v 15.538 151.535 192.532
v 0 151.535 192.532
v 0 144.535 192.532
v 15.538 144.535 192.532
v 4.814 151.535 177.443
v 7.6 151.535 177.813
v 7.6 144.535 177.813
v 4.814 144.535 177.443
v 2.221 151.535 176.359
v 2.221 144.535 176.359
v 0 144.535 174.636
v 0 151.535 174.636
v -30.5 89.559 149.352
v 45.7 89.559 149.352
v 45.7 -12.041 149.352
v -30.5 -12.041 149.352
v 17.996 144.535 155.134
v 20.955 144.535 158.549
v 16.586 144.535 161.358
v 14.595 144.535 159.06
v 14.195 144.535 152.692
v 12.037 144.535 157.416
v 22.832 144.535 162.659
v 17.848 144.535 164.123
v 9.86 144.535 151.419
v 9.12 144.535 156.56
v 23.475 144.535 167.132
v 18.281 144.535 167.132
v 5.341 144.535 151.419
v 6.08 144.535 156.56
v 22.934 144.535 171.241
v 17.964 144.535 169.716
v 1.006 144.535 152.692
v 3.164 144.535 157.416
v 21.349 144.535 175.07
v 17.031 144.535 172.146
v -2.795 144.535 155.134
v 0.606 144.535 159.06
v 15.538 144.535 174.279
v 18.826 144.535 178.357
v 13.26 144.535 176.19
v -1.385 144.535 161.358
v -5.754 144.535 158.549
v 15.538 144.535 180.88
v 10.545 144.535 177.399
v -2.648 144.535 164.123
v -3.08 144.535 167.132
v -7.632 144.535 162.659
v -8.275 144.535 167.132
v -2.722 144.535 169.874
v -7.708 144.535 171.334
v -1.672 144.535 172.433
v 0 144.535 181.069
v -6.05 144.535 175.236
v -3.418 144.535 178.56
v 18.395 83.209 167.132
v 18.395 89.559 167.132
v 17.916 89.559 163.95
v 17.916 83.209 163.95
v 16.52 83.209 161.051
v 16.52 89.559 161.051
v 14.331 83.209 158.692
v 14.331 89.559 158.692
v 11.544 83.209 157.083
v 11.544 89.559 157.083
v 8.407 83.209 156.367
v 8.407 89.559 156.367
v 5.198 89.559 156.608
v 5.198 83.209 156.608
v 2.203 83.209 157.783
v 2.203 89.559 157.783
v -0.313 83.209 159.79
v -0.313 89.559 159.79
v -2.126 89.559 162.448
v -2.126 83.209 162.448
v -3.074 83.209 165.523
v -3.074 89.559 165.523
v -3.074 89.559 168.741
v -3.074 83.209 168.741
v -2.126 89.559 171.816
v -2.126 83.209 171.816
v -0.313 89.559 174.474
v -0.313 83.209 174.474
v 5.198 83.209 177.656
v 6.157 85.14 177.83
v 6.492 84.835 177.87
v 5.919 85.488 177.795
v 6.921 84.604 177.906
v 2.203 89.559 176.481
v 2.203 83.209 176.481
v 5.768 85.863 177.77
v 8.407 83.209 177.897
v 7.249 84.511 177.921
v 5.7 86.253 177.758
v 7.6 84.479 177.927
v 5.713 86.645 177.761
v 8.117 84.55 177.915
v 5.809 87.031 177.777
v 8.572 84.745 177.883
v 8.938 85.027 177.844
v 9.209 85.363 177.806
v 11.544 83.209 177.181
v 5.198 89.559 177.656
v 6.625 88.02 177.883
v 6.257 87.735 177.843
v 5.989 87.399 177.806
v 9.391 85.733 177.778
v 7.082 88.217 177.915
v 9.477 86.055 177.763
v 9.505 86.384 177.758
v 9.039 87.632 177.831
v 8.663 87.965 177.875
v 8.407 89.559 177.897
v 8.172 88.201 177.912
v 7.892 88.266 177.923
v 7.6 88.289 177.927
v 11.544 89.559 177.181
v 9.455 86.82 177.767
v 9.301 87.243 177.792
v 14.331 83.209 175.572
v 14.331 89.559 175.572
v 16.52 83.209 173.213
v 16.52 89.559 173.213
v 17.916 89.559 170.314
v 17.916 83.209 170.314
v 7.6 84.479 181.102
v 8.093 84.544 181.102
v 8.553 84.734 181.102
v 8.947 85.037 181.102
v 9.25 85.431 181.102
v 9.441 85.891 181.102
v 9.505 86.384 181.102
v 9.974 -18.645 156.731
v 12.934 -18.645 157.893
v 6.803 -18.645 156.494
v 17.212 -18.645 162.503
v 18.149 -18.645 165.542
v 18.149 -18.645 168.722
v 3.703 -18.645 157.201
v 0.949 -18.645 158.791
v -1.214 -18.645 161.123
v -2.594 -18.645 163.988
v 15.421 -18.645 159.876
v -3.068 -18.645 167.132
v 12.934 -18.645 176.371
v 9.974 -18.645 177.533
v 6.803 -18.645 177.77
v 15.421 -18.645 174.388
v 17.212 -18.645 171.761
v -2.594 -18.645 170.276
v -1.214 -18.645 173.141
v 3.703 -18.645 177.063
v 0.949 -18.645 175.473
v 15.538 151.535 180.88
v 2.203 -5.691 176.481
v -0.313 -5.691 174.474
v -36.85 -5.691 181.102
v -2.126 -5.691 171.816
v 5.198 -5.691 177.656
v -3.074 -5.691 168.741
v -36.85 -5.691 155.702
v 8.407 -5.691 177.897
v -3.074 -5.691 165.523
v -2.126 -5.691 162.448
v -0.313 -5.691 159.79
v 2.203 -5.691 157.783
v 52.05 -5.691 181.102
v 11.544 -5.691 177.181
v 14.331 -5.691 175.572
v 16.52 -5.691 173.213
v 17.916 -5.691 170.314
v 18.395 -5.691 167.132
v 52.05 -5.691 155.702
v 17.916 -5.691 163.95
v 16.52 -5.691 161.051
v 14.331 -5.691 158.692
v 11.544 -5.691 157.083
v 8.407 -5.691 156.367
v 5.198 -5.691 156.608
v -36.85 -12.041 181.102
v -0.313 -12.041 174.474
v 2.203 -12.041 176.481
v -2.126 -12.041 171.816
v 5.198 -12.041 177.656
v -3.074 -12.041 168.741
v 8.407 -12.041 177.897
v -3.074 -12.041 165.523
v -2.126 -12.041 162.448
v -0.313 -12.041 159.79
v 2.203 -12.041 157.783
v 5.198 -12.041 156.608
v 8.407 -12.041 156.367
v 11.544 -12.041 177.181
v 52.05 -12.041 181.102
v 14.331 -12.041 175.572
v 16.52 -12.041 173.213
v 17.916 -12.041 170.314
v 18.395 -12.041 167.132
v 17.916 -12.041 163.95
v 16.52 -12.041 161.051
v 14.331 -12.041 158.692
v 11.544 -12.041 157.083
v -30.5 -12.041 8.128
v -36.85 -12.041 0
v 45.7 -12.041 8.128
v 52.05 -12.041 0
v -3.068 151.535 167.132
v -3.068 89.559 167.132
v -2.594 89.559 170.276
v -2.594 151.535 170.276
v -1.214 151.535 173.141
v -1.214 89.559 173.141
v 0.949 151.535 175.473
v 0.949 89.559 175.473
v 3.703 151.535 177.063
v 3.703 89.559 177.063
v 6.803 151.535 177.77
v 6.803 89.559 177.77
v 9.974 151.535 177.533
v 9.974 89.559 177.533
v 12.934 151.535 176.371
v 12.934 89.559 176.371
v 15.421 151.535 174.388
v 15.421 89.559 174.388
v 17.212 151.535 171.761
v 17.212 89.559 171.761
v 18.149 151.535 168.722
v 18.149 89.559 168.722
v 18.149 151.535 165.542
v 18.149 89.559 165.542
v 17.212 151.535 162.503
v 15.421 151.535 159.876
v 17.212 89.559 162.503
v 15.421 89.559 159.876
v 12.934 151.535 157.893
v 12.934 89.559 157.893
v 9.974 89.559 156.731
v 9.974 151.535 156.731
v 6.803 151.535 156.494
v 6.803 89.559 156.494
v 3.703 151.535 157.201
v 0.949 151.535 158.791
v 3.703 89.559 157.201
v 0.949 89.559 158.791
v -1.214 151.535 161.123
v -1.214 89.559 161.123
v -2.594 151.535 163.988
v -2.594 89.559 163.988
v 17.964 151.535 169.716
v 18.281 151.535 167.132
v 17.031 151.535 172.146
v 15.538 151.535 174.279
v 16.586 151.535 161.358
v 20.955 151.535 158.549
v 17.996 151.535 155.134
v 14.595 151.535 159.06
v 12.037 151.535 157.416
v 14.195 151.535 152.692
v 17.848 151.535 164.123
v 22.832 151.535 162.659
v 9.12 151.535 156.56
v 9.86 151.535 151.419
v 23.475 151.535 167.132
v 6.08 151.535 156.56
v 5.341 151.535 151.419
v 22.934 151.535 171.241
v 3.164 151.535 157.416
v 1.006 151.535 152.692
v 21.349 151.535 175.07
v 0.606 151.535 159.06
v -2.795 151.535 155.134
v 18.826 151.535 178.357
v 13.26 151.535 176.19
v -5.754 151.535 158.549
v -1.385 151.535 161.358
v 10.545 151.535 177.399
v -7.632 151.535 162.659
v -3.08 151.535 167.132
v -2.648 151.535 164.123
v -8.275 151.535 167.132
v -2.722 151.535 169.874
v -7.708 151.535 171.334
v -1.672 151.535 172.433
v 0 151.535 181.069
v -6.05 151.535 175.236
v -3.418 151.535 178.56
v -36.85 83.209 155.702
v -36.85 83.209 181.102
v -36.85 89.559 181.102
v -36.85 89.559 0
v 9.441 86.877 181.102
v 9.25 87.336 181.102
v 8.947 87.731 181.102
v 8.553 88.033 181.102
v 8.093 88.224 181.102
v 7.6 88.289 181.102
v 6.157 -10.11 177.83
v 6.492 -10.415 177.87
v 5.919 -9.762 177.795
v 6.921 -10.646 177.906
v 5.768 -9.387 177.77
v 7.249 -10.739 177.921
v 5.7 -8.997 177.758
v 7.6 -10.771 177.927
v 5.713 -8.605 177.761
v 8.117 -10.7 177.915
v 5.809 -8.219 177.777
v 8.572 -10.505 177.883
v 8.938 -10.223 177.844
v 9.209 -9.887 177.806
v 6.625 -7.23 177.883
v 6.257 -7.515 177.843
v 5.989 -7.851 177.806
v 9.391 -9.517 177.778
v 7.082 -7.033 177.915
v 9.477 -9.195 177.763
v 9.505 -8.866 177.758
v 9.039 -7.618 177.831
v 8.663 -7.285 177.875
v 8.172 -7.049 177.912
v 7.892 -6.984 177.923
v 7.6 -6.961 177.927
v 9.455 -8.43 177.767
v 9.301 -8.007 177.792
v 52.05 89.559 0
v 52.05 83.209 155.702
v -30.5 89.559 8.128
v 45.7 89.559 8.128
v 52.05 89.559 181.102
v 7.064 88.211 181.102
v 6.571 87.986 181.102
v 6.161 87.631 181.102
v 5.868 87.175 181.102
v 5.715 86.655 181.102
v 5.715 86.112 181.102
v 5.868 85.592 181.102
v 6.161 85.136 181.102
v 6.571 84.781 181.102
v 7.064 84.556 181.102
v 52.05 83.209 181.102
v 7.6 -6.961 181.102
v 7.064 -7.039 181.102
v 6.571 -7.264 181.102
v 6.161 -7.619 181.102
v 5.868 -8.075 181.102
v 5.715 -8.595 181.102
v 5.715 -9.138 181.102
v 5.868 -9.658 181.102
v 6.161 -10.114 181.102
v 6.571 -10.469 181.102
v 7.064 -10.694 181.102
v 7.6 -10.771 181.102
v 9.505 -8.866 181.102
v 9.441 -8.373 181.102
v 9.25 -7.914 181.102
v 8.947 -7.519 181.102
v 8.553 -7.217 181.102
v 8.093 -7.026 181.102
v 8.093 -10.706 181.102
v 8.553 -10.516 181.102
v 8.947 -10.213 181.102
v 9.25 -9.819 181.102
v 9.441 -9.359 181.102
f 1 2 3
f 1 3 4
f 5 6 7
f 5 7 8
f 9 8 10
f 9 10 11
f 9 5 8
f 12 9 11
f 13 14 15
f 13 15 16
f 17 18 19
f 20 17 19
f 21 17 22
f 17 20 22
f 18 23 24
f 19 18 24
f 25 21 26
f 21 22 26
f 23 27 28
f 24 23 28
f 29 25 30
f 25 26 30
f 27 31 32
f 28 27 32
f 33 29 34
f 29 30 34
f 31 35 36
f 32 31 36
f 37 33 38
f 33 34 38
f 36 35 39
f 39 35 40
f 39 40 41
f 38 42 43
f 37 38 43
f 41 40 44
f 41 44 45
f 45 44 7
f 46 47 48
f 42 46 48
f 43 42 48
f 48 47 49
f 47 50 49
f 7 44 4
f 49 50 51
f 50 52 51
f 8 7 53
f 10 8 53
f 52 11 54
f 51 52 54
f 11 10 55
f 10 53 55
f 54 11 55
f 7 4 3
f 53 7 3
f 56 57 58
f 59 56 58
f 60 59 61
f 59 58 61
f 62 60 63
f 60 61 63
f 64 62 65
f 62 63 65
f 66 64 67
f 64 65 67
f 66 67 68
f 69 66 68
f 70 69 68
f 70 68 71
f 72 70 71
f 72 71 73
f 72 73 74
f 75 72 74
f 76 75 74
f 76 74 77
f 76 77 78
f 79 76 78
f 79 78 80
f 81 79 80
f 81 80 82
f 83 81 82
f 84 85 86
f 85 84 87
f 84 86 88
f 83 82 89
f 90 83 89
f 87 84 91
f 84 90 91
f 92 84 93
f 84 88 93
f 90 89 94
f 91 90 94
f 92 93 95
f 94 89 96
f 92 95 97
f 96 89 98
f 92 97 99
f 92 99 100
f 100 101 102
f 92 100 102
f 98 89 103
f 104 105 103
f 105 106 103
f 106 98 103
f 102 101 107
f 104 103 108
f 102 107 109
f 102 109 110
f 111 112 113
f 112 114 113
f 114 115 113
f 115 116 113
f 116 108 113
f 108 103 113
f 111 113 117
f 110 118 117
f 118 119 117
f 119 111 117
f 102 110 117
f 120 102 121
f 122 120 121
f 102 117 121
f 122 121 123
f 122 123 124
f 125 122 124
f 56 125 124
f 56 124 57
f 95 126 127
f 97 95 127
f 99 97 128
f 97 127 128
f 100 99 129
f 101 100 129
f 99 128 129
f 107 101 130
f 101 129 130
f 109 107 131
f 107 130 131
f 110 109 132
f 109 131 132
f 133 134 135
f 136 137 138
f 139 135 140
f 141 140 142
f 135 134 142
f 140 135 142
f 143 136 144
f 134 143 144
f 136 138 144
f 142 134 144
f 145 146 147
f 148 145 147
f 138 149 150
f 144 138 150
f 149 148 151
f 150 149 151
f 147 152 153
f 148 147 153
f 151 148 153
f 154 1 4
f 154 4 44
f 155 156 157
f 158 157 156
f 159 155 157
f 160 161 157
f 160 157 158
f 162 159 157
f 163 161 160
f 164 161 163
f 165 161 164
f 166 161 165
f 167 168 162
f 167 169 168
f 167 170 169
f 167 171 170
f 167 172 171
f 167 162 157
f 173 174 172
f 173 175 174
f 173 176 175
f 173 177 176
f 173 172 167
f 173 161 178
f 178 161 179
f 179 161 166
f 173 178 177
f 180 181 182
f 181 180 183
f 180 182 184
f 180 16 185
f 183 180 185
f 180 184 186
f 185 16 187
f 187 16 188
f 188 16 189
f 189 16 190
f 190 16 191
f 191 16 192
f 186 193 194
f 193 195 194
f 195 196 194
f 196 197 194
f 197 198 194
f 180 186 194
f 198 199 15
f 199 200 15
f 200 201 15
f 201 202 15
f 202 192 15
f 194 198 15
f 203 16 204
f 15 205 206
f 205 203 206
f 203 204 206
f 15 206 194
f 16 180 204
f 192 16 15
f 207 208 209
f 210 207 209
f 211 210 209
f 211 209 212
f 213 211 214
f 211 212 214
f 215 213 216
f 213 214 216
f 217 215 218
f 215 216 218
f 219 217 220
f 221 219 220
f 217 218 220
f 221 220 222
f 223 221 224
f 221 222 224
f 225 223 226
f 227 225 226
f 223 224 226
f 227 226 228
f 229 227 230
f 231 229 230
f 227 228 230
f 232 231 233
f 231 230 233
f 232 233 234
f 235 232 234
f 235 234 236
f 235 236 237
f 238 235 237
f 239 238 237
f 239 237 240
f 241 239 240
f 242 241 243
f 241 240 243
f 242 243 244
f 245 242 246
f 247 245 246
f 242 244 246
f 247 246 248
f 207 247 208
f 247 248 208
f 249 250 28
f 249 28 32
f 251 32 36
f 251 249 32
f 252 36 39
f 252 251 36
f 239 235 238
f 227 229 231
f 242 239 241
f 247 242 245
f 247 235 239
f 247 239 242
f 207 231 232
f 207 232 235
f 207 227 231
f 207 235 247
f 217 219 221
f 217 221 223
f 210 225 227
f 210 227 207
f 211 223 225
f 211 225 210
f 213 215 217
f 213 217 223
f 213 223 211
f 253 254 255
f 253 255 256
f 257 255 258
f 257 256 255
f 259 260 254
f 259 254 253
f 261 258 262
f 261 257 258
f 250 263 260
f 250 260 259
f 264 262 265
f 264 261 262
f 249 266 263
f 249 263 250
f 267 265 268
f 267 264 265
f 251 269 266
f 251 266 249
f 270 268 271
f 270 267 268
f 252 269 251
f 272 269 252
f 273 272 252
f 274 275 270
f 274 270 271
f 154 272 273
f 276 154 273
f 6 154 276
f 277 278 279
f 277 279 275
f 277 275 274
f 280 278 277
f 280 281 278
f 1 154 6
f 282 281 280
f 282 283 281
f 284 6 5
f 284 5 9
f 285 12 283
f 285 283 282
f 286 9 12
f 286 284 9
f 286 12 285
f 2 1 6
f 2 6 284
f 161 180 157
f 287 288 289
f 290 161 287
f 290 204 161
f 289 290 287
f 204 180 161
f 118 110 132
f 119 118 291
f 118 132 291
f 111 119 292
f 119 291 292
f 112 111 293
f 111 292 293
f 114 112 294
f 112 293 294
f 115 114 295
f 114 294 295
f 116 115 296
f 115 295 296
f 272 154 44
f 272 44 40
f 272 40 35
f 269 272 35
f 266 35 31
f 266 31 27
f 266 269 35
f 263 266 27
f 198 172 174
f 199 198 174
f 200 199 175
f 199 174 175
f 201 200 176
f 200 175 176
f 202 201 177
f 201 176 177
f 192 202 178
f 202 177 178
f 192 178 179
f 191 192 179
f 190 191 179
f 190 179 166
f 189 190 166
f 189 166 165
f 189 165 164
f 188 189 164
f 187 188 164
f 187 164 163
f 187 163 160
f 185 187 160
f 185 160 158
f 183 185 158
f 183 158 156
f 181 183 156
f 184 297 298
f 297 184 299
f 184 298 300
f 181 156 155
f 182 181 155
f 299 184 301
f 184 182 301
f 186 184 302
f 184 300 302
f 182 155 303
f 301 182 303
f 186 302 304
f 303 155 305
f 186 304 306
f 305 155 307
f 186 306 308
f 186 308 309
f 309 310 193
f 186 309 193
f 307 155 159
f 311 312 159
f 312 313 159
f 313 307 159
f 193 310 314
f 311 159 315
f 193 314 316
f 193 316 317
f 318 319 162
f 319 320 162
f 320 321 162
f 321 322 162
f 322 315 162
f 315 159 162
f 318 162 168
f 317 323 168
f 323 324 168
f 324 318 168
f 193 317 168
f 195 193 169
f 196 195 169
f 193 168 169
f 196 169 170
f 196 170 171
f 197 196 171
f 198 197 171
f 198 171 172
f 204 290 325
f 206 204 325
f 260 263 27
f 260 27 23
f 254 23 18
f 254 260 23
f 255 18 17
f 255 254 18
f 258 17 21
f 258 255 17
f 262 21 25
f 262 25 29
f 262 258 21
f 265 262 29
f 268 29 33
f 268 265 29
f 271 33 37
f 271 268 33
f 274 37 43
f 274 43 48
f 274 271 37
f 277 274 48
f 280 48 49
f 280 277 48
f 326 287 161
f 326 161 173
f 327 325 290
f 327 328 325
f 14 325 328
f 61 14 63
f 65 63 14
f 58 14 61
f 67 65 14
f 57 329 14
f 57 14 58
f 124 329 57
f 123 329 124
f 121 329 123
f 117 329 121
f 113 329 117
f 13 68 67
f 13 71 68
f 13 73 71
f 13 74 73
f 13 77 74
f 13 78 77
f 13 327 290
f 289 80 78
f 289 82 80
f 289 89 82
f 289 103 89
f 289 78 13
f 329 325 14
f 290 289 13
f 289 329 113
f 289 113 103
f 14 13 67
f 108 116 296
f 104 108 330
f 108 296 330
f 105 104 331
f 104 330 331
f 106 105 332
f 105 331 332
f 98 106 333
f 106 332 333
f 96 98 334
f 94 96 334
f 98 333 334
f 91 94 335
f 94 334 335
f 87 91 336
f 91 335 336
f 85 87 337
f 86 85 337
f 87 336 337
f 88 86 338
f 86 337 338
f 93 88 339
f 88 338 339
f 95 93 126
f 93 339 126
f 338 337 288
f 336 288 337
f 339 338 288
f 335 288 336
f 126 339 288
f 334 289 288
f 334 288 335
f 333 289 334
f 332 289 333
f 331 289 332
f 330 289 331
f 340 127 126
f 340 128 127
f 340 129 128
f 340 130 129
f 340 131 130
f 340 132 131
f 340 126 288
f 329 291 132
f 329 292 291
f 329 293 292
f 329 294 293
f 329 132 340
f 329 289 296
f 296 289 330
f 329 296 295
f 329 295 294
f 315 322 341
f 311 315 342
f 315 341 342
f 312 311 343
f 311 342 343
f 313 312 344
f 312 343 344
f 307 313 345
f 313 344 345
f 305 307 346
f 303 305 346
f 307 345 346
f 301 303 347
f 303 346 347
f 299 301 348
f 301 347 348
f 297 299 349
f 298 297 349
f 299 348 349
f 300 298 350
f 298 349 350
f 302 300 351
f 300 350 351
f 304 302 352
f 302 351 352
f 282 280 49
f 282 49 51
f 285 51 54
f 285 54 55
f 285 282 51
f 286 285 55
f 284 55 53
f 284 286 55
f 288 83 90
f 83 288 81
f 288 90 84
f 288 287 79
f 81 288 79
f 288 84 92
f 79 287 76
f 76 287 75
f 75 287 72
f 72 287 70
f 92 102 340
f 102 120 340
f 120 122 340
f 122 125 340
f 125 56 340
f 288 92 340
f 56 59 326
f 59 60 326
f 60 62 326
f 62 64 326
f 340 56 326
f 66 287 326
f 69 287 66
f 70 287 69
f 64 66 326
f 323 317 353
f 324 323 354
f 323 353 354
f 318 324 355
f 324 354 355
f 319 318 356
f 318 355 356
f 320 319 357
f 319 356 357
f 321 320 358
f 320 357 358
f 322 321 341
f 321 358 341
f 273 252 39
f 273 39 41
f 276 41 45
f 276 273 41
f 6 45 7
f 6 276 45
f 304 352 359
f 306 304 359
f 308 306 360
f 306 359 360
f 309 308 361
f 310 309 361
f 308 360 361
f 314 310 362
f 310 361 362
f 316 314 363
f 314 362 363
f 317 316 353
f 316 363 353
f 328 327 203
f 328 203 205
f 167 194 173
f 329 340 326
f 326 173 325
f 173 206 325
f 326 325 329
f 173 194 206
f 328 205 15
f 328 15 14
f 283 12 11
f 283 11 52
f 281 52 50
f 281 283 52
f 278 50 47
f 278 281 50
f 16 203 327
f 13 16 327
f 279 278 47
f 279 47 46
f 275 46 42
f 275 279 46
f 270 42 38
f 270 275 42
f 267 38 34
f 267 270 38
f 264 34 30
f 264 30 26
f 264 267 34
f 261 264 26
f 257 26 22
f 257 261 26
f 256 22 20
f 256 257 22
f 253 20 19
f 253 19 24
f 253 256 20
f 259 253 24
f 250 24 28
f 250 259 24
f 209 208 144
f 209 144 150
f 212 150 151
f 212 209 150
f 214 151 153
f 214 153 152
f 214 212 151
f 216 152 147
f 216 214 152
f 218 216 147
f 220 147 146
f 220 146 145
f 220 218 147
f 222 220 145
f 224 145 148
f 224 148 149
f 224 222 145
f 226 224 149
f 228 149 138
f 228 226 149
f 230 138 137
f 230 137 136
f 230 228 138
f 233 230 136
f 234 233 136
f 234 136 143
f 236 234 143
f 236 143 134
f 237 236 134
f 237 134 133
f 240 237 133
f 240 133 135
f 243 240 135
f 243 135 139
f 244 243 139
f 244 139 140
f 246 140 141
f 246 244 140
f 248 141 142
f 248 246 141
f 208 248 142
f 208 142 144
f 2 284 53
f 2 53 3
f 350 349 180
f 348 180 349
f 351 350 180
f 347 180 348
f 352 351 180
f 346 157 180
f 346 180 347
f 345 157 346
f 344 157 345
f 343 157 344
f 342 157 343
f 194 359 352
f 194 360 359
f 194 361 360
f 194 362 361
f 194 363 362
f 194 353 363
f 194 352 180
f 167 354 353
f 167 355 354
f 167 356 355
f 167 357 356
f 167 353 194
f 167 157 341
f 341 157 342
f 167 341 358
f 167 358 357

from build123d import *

# Parameters (mm, degrees)
F0_W      = 88.9
F0_H      = 101.6
F1_DEPTH  = 8.128
F2_W      = 6.35
F2_H      = 101.6
F3_DEPTH  = 141.224
F5_DEPTH  = 101.6
F6_W      = 88.9
F6_H      = 6.35
F7_DEPTH  = 25.4
F9_DEPTH  = 153.162
F10_R     = 10.668
F11_DEPTH = 108.204
F12_DEPTH = 61.976
F14_DEPTH = 7
F16_DEPTH = 7.62
F18_DEPTH = 7.62


with BuildPart() as f1:
    # F0 (on Top) → F1 (new body)
    with BuildSketch(Plane.XY):
        with Locations((7.6004267454, 38.7586035386)):
            Rectangle(F0_W, F0_H)
    extrude(amount=F1_DEPTH)

    # F2 (on face) → F3 (join)
    with BuildSketch(Plane.XY.offset(8.128)):
        with Locations((48.8754267454, 38.7586035386)):
            Rectangle(F2_W, F2_H)
        with Locations((-33.6745732546, 38.7586035386)):
            Rectangle(F2_W, F2_H)
    extrude(amount=F3_DEPTH)

    # F4 (on face) → F5 (join)
    with BuildSketch(Plane(origin=(0, 89.5586035386, 0), x_dir=(-1, 0, 0), z_dir=(0, 1, 0))):
        Polygon((-52.0504267454, 155.702), (-52.0504267454, 149.352), (-45.7004267454, 149.352), (30.4995732546, 149.352), (36.8495732546, 149.352), (36.8495732546, 155.702), align=None)
    extrude(amount=-F5_DEPTH)

    # F6 (on face) → F7 (join)
    with BuildSketch(Plane.XY.offset(155.702)):
        with Locations((7.6004267454, -8.8663964614)):
            Rectangle(F6_W, F6_H)
        with Locations((7.6004267454, 86.3836035386)):
            Rectangle(F6_W, F6_H)
    extrude(amount=F7_DEPTH)

    # F8 (on face) → F9 (cut)
    with BuildSketch(Plane(origin=(0, 89.5586035386, 0), x_dir=(-1, 0, 0), z_dir=(0, 1, 0))):
        with BuildLine():
            Line((-7.6004267454, 167.132), (3.1945732546, 167.132))
            ThreePointArc((3.1945732546, 167.132), (-7.6004267454, 177.927), (-18.3954267454, 167.132))
            Line((-18.3954267454, 167.132), (-7.6004267454, 167.132))
        make_face()
        with BuildLine():
            ThreePointArc((-18.3954267454, 167.132), (-7.6004267454, 156.337), (3.1945732546, 167.132))
            Line((3.1945732546, 167.132), (-7.6004267454, 167.132))
            Line((-7.6004267454, 167.132), (-18.3954267454, 167.132))
        make_face()
    extrude(amount=-F9_DEPTH, mode=Mode.SUBTRACT)

    # F15 (on face) → F16 (cut)
    with BuildSketch(Plane.XY.offset(181.102)):
        with BuildLine():
            ThreePointArc((9.5054267454, -8.8663964614), (8.9474651636, -7.5193580433), (7.6004267454, -6.9613964614))
            Line((7.6004267454, -6.9613964614), (7.6004267454, -10.7713964614))
            ThreePointArc((7.6004267454, -10.7713964614), (8.9474651636, -10.2134348796), (9.5054267454, -8.8663964614))
        make_face()
        with BuildLine():
            Line((7.6004267454, -10.7713964614), (7.6004267454, -6.9613964614))
            ThreePointArc((7.6004267454, -6.9613964614), (5.6954267454, -8.8663964614), (7.6004267454, -10.7713964614))
        make_face()
    extrude(amount=-F16_DEPTH, mode=Mode.SUBTRACT)

    # F17 (on face) → F18 (cut)
    with BuildSketch(Plane.XY.offset(181.102)):
        with BuildLine():
            ThreePointArc((9.5054267454, 86.3836035386), (8.9474651636, 87.7306419567), (7.6004267454, 88.2886035386))
            Line((7.6004267454, 88.2886035386), (7.6004267454, 84.4786035386))
            ThreePointArc((7.6004267454, 84.4786035386), (8.9474651636, 85.0365651204), (9.5054267454, 86.3836035386))
        make_face()
        with BuildLine():
            Line((7.6004267454, 84.4786035386), (7.6004267454, 88.2886035386))
            ThreePointArc((7.6004267454, 88.2886035386), (5.6954267454, 86.3836035386), (7.6004267454, 84.4786035386))
        make_face()
    extrude(amount=-F18_DEPTH, mode=Mode.SUBTRACT)


with BuildPart() as f11:
    # F10 (on face) → F11 (new body)
    with BuildSketch(Plane(origin=(0, 89.5586035386, 0), x_dir=(-1, 0, 0), z_dir=(0, 1, 0))):
        with Locations((-7.6004267454, 167.132)):
            Circle(F10_R)
    extrude(amount=-F11_DEPTH)

    # F12 (add): a face of the model
    f12_faces = [f11.faces().sort_by_distance(p)[0] for p in [
        (7.6004267454, 89.5586035386, 167.132),
    ]]
    extrude(f12_faces, amount=F12_DEPTH)


with BuildPart() as f14:
    # F13 (on face) → F14 (new body)
    with BuildSketch(Plane(origin=(0, 151.5346035386, 0), x_dir=(-1, 0, 0), z_dir=(0, 1, 0))):
        with BuildLine():
            Line((-18.2811267454, 167.132), (-23.4754267454, 167.132))
            ThreePointArc((-23.4754267454, 167.132), (-7.6004267454, 151.257), (8.2745732546, 167.132))
            Line((8.2745732546, 167.132), (3.0802732546, 167.132))
            ThreePointArc((3.0802732546, 167.132), (-7.6004267454, 156.4513), (-18.2811267454, 167.132))
        make_face()
        with BuildLine():
            ThreePointArc((-15.5379267454, 180.8801532851), (-21.3485800305, 175.0695), (-23.4754267454, 167.132))
            Line((-23.4754267454, 167.132), (-18.2811267454, 167.132))
            ThreePointArc((-18.2811267454, 167.132), (-17.5717709061, 170.9594858746), (-15.5379267454, 174.2785688439))
            Line((-15.5379267454, 174.2785688439), (-15.5379267454, 180.8801532851))
        make_face()
        with BuildLine():
            Line((0, 174.6360566214), (0, 181.069328951))
            ThreePointArc((0, 181.069328951), (-3.6786587829, 182.514956837), (-7.6004267454, 183.007))
            Line((-7.6004267454, 183.007), (-7.6004267454, 177.8127))
            ThreePointArc((-7.6004267454, 177.8127), (-3.4816420379, 176.9865910632), (0, 174.6360566214))
        make_face()
        with BuildLine():
            Line((3.0802732546, 167.132), (8.2745732546, 167.132))
            ThreePointArc((8.2745732546, 167.132), (6.0500750692, 175.2362843736), (0, 181.069328951))
            Line((0, 181.069328951), (0, 174.6360566214))
            ThreePointArc((0, 174.6360566214), (2.2802420181, 171.1878275697), (3.0802732546, 167.132))
        make_face()
        with BuildLine():
            ThreePointArc((-7.6004267454, 183.007), (-11.7091790864, 182.4660724923), (-15.5379267454, 180.8801532851))
            Line((-15.5379267454, 180.8801532851), (-15.5379267454, 174.2785688439))
            ThreePointArc((-15.5379267454, 174.2785688439), (-11.9447906021, 176.8892462903), (-7.6004267454, 177.8127))
            Line((-7.6004267454, 177.8127), (-7.6004267454, 183.007))
        make_face()
        with BuildLine():
            Line((-15.5379267454, 192.532), (-15.5379267454, 180.8801532851))
            ThreePointArc((-15.5379267454, 180.8801532851), (-11.7091790864, 182.4660724923), (-7.6004267454, 183.007))
            ThreePointArc((-7.6004267454, 183.007), (-3.6786587829, 182.514956837), (0, 181.069328951))
            Line((0, 181.069328951), (0, 192.532))
            Line((0, 192.532), (-15.5379267454, 192.532))
        make_face()
    extrude(amount=-F14_DEPTH)


solid = Compound([f1.part, f11.part, f14.part])
